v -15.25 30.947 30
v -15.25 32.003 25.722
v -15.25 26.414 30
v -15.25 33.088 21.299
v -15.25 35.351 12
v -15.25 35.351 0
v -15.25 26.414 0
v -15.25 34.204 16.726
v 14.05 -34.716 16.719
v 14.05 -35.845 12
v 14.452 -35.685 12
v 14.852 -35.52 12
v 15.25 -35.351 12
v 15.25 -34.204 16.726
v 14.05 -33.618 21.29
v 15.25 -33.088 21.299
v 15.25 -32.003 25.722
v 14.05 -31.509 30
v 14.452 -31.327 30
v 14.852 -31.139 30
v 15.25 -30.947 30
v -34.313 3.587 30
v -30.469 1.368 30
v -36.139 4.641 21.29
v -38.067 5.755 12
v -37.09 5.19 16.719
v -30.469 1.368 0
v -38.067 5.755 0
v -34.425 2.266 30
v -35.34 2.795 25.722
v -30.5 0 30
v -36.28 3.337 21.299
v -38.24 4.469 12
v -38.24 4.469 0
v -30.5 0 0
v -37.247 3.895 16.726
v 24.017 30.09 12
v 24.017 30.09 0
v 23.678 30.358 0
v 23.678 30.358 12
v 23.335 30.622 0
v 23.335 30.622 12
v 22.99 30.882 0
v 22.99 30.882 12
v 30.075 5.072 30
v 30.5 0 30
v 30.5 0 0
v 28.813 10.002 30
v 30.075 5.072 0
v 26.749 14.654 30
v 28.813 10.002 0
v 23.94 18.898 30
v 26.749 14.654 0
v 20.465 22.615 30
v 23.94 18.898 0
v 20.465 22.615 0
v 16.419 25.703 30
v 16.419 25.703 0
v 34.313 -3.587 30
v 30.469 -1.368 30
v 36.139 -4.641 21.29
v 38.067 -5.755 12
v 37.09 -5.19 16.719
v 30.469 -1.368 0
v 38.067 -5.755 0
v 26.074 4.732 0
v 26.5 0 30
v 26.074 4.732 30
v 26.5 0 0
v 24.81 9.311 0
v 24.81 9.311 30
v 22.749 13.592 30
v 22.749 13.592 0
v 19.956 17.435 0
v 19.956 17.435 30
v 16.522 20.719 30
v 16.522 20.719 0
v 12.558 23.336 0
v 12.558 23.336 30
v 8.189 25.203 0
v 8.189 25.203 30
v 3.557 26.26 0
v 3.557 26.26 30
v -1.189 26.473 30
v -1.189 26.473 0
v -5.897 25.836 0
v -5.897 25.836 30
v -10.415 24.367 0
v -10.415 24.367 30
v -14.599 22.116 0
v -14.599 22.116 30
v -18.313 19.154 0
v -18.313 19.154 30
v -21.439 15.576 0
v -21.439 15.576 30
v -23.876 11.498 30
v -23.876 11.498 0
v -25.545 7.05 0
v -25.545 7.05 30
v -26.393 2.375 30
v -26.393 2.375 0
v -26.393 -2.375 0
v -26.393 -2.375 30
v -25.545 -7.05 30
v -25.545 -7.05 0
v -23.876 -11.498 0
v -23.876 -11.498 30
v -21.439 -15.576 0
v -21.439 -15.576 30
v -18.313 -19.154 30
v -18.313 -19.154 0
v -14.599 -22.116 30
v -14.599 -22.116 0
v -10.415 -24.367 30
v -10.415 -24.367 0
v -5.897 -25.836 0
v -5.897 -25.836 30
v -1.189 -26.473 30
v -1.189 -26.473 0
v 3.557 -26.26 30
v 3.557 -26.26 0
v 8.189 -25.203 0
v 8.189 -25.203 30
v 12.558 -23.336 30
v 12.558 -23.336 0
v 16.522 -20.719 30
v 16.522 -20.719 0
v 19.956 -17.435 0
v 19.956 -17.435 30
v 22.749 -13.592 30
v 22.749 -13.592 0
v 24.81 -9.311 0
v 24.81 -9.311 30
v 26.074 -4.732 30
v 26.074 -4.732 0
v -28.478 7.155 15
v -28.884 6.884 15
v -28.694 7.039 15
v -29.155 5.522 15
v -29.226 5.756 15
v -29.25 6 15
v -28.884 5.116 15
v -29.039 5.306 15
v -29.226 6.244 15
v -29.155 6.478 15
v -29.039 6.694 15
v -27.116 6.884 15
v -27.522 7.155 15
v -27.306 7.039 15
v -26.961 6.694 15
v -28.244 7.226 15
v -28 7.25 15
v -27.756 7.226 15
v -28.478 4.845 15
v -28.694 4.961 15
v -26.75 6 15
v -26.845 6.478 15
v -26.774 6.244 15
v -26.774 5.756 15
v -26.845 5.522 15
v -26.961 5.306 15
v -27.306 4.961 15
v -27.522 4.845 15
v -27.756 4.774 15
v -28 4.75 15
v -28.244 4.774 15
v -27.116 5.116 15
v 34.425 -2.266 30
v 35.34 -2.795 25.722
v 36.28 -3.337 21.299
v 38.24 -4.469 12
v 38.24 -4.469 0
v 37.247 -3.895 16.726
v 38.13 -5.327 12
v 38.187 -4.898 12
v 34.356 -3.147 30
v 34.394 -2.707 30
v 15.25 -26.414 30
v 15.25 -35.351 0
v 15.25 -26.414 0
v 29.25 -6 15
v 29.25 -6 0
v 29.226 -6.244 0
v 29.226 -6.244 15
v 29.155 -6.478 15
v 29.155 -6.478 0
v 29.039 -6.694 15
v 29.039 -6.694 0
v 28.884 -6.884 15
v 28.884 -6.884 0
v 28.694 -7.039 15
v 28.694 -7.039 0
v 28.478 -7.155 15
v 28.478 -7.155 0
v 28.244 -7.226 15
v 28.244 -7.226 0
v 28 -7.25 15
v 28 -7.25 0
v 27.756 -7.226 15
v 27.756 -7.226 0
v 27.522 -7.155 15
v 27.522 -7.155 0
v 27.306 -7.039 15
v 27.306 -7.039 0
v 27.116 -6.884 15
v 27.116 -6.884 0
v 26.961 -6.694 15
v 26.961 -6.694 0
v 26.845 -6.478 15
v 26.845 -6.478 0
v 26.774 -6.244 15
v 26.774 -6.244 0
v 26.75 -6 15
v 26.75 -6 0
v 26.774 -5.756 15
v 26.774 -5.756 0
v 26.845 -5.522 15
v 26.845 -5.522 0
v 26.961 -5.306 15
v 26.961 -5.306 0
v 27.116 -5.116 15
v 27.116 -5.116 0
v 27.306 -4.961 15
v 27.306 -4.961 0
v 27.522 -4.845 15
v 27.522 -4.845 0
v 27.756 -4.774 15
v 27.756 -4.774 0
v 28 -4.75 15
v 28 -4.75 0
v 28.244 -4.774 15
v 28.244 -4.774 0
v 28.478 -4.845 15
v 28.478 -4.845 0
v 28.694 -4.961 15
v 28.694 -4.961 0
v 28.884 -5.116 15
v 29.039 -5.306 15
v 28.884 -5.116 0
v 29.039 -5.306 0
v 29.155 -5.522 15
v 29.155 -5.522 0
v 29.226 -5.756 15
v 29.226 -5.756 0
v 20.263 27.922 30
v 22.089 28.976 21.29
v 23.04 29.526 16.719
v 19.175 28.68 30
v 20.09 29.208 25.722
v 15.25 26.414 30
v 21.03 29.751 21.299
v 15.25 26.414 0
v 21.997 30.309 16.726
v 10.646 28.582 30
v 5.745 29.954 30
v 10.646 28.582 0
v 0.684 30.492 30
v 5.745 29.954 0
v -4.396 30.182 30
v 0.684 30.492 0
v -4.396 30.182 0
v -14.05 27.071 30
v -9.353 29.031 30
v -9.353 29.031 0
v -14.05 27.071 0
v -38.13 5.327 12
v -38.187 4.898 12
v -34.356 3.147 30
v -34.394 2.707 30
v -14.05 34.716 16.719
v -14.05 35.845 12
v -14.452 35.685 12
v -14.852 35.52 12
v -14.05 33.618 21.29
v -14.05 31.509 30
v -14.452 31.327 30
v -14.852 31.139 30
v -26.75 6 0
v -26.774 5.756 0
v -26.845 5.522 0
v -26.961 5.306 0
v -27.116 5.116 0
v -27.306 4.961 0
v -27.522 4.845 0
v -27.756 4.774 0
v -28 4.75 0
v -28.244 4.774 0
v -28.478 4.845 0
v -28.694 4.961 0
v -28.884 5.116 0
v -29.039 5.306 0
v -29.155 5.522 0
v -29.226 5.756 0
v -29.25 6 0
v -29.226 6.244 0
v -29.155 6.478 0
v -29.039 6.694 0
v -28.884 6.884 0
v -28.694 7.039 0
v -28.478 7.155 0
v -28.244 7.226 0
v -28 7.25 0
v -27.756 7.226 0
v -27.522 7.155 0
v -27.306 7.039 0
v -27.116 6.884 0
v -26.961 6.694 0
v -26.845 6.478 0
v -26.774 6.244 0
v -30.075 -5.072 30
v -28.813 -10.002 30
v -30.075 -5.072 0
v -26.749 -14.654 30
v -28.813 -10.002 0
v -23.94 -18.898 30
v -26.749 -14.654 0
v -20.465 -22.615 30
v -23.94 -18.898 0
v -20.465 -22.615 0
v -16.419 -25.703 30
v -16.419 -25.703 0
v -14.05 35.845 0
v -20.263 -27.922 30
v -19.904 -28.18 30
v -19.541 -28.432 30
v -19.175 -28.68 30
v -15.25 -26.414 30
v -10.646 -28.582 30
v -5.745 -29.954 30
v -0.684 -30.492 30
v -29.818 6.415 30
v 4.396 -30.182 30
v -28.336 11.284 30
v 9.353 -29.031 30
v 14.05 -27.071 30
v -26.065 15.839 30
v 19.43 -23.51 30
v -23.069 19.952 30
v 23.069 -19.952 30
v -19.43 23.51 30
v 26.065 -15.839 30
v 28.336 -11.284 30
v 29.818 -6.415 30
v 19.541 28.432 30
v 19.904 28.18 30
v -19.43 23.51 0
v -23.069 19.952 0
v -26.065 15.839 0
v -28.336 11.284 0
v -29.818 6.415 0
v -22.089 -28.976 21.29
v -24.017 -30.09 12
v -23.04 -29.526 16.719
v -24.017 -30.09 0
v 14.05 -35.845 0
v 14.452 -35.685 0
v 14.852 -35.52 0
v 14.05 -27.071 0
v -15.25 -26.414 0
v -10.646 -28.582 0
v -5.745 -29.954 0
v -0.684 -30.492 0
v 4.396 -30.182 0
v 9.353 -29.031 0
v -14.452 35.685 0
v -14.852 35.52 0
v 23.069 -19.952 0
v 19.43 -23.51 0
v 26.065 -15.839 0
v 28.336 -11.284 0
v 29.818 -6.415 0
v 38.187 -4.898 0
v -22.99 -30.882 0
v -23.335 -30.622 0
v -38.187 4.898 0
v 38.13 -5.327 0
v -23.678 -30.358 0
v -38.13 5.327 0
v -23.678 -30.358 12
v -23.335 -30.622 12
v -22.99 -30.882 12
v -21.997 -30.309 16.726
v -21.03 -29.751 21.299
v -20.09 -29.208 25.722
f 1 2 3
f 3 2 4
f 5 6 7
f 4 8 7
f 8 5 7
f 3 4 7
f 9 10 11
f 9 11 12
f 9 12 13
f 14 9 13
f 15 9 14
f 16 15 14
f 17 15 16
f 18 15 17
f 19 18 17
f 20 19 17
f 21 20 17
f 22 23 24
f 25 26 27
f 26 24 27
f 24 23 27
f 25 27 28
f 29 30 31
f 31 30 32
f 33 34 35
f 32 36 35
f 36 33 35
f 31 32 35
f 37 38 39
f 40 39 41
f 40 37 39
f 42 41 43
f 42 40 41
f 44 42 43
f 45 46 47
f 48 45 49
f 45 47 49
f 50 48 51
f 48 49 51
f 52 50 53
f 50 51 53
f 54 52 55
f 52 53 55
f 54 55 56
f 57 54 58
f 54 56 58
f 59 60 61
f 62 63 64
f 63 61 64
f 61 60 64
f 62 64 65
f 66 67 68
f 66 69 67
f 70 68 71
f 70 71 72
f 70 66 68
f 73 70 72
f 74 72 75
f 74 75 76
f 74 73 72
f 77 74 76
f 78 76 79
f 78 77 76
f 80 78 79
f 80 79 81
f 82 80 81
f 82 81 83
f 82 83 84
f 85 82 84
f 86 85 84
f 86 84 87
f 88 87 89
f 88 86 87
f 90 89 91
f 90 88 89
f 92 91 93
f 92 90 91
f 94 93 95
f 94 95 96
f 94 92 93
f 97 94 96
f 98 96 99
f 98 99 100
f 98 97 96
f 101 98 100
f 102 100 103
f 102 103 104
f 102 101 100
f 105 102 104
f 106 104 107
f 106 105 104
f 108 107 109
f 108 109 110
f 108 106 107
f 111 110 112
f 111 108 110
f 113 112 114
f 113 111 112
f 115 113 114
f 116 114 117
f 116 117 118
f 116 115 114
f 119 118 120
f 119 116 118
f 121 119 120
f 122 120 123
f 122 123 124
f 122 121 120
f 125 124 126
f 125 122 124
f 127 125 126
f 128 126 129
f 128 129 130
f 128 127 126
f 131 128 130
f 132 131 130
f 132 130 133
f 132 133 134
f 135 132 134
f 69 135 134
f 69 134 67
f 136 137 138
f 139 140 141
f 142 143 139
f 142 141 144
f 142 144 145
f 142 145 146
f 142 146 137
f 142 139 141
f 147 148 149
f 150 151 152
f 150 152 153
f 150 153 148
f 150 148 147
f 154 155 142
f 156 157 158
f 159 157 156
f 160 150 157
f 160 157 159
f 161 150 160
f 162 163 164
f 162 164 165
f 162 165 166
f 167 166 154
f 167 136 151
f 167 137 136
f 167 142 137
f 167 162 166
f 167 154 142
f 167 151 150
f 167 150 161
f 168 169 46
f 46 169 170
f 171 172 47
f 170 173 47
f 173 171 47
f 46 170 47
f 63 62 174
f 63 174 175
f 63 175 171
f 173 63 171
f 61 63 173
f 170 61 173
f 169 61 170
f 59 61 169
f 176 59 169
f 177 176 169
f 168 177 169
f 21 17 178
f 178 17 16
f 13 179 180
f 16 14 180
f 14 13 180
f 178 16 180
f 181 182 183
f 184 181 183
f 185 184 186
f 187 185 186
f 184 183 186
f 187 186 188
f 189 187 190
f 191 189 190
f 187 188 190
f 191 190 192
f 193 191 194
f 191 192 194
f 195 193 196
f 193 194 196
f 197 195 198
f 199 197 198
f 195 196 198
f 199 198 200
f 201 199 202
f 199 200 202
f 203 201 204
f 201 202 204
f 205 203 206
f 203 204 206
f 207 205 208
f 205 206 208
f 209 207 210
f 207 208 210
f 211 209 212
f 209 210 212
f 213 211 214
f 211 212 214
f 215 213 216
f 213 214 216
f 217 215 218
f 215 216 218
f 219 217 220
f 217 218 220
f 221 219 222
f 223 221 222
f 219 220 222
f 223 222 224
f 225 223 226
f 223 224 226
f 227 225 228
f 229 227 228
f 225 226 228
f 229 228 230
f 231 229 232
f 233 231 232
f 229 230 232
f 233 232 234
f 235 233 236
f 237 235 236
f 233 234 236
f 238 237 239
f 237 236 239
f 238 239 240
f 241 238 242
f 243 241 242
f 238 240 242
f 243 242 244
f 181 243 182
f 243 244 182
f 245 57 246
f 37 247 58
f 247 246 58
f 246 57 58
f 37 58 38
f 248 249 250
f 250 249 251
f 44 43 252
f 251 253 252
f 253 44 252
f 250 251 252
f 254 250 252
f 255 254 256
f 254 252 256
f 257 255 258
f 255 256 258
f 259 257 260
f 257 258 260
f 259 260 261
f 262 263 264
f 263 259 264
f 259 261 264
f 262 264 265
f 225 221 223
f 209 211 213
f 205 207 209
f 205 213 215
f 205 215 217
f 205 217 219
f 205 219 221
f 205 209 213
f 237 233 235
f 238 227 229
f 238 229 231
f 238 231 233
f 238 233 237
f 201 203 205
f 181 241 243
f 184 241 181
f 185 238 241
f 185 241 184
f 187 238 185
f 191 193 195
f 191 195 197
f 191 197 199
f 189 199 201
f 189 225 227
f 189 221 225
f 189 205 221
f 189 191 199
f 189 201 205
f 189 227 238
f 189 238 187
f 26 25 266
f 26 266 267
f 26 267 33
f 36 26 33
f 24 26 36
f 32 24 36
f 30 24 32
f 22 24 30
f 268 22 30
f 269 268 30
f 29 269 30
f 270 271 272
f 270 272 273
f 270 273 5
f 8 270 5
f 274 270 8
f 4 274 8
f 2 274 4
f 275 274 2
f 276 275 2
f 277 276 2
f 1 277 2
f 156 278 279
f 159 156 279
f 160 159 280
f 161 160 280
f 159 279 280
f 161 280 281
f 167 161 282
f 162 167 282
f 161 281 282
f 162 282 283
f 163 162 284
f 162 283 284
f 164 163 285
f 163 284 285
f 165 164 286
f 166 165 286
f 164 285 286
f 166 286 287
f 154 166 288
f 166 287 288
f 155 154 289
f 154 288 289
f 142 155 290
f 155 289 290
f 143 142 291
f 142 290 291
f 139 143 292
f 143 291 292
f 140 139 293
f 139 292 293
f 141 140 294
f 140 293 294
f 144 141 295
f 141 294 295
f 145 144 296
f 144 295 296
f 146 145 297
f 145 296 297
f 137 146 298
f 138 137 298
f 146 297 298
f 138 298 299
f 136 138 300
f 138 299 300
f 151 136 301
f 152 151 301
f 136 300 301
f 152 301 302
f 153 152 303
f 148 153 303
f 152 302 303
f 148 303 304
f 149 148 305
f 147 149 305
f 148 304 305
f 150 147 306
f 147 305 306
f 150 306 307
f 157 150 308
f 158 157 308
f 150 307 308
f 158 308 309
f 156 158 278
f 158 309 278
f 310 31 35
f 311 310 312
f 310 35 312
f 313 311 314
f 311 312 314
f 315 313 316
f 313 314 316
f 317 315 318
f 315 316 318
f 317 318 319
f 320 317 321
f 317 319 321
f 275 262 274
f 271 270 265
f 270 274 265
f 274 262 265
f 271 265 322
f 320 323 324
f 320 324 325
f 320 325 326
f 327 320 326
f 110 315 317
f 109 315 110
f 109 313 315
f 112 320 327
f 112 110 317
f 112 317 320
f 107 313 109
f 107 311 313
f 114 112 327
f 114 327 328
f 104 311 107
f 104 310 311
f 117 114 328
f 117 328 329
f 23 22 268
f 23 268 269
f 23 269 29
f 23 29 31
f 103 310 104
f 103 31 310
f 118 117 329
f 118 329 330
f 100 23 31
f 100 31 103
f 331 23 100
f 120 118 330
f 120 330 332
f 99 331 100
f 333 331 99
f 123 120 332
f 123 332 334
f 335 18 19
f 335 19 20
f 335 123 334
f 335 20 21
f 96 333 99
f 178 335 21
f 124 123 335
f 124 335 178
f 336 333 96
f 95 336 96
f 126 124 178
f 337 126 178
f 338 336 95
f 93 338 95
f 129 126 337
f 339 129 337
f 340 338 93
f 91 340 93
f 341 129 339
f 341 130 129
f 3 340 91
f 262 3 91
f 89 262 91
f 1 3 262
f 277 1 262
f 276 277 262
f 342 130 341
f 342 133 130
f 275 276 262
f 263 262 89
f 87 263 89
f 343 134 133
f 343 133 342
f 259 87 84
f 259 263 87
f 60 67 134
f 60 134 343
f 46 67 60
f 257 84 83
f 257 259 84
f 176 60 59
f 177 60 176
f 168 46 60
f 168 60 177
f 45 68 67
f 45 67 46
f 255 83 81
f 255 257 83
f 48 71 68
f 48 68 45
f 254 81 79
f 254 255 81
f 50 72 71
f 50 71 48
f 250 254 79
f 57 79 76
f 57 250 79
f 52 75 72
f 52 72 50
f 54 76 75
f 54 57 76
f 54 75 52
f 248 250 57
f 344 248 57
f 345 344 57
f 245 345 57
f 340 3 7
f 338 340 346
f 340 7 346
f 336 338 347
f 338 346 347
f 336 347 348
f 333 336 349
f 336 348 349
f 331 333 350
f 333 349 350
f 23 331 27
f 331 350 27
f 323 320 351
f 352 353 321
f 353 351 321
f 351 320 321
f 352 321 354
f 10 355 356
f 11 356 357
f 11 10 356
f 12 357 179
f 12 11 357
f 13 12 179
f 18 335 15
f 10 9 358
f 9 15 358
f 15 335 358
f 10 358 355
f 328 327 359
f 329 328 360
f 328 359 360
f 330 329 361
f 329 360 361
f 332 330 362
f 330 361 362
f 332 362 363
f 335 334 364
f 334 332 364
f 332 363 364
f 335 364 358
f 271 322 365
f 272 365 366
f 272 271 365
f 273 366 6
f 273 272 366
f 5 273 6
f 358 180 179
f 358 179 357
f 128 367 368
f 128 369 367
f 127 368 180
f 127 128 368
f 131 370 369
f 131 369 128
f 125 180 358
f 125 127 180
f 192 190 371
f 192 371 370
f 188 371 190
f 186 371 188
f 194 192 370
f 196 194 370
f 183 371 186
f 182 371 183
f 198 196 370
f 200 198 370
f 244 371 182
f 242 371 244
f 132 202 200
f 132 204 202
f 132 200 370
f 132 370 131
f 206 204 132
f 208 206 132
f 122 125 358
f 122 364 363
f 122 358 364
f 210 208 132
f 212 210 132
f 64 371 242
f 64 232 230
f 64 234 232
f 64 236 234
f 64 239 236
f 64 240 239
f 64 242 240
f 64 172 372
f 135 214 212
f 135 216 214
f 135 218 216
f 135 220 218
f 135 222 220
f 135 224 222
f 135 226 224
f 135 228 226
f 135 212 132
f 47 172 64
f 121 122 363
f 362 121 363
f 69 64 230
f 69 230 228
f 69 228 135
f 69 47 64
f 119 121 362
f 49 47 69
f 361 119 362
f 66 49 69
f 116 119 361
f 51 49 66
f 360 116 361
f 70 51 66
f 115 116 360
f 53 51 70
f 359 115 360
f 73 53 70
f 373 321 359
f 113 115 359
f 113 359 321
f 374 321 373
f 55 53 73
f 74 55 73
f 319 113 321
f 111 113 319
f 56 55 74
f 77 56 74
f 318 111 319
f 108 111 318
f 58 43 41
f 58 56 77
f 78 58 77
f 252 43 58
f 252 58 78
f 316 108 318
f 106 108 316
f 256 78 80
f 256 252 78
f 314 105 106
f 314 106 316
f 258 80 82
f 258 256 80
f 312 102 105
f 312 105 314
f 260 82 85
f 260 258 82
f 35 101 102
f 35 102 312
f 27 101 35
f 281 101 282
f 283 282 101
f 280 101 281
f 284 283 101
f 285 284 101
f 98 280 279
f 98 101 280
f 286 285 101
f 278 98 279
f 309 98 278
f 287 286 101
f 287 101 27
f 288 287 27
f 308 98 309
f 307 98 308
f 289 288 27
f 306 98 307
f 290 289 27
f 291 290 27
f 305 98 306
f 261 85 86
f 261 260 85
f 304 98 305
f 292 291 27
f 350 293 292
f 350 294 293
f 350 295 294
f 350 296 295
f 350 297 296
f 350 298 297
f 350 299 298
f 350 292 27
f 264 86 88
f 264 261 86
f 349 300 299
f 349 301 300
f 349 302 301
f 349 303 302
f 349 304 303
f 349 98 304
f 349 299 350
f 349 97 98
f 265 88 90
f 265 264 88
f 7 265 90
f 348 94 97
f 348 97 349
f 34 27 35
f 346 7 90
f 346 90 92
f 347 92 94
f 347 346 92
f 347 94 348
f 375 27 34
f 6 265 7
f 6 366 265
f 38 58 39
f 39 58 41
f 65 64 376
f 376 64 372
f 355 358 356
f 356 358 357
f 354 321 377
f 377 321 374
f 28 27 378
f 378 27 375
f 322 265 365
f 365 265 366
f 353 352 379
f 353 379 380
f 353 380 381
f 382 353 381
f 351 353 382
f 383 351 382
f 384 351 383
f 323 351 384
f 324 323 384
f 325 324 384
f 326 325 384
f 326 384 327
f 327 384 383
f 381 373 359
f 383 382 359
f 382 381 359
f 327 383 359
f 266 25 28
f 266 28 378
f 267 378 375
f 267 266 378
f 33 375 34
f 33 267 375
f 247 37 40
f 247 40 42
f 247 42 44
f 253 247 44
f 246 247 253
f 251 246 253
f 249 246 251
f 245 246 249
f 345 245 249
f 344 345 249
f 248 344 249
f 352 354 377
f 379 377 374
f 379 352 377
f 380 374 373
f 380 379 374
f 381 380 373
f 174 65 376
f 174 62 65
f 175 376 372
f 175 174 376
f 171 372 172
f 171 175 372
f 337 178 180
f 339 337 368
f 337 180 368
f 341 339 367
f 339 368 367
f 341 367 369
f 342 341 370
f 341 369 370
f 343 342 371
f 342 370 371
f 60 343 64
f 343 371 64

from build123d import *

# Parameters (mm, degrees)
F2_R     = 1.25
F3_DEPTH = 15
F5_DEPTH = 30.001


with BuildPart() as f1:
    # F0 (on Front) → F1 (revolve)
    with BuildSketch(Plane.XZ):
        Polygon((34.5, 30), (26.5, 30), (26.5, 0), (38.5, 0), (38.5, 12), align=None)
    revolve(axis=Axis((0, 0, 21.473579), (0, 0, 1)))

    # F2 (on face) → F3 (cut)
    with BuildSketch(Plane(origin=(0, 0, 0), x_dir=(1, 0, 0), z_dir=(0, 0, -1))):
        with Locations((-28, -6)):
            Circle(F2_R)
        with Locations((28, 6)):
            Circle(F2_R)
    extrude(amount=-F3_DEPTH, mode=Mode.SUBTRACT)

    # F4 (on face) → F5 (cut, through all)
    with BuildSketch(Plane(origin=(0, 0, 0), x_dir=(1, 0, 0), z_dir=(0, 0, -1))):
        with BuildLine():
            Line((-48.065083, -10.141205), (-30.5, 0))
            ThreePointArc((-30.5, 0), (-26.749196, 14.653687), (-16.419309, 25.703235))
            Line((-16.419309, 25.703235), (-33.739817, 35.703235))
            ThreePointArc((-33.739817, 35.703235), (-46.88751, 14.6512), (-48.065083, -10.141205))
        make_face()
        with BuildLine():
            Line((-30.469309, -1.367921), (-47.789817, -11.367921))
            ThreePointArc((-47.789817, -11.367921), (-36.132066, -33.280175), (-15.25, -46.696186))
            Line((-15.25, -46.696186), (-15.25, -26.413775))
            ThreePointArc((-15.25, -26.413775), (-26.065063, -15.838639), (-30.469309, -1.367921))
        make_face()
        with BuildLine():
            Line((-14.05, -27.071156), (-14.05, -47.071156))
            ThreePointArc((-14.05, -47.071156), (10.755444, -47.931375), (32.815083, -36.55498))
            Line((32.815083, -36.55498), (15.25, -26.413775))
            ThreePointArc((15.25, -26.413775), (0.684133, -30.492326), (-14.05, -27.071156))
        make_face()
        with BuildLine():
            Line((16.419309, -25.703235), (33.739817, -35.703235))
            ThreePointArc((33.739817, -35.703235), (46.88751, -14.6512), (48.065083, 10.141205))
            Line((48.065083, 10.141205), (30.5, 0))
            ThreePointArc((30.5, 0), (26.749196, -14.653687), (16.419309, -25.703235))
        make_face()
        with BuildLine():
            Line((30.469309, 1.367921), (47.789817, 11.367921))
            ThreePointArc((47.789817, 11.367921), (36.132066, 33.280175), (15.25, 46.696186))
            Line((15.25, 46.696186), (15.25, 26.413775))
            ThreePointArc((15.25, 26.413775), (26.065063, 15.838639), (30.469309, 1.367921))
        make_face()
        with BuildLine():
            Line((14.05, 27.071156), (14.05, 47.071156))
            ThreePointArc((14.05, 47.071156), (-10.755444, 47.931375), (-32.815083, 36.55498))
            Line((-32.815083, 36.55498), (-15.25, 26.413775))
            ThreePointArc((-15.25, 26.413775), (-0.684133, 30.492326), (14.05, 27.071156))
        make_face()
    extrude(amount=-F5_DEPTH, mode=Mode.SUBTRACT)


solid = f1.part
